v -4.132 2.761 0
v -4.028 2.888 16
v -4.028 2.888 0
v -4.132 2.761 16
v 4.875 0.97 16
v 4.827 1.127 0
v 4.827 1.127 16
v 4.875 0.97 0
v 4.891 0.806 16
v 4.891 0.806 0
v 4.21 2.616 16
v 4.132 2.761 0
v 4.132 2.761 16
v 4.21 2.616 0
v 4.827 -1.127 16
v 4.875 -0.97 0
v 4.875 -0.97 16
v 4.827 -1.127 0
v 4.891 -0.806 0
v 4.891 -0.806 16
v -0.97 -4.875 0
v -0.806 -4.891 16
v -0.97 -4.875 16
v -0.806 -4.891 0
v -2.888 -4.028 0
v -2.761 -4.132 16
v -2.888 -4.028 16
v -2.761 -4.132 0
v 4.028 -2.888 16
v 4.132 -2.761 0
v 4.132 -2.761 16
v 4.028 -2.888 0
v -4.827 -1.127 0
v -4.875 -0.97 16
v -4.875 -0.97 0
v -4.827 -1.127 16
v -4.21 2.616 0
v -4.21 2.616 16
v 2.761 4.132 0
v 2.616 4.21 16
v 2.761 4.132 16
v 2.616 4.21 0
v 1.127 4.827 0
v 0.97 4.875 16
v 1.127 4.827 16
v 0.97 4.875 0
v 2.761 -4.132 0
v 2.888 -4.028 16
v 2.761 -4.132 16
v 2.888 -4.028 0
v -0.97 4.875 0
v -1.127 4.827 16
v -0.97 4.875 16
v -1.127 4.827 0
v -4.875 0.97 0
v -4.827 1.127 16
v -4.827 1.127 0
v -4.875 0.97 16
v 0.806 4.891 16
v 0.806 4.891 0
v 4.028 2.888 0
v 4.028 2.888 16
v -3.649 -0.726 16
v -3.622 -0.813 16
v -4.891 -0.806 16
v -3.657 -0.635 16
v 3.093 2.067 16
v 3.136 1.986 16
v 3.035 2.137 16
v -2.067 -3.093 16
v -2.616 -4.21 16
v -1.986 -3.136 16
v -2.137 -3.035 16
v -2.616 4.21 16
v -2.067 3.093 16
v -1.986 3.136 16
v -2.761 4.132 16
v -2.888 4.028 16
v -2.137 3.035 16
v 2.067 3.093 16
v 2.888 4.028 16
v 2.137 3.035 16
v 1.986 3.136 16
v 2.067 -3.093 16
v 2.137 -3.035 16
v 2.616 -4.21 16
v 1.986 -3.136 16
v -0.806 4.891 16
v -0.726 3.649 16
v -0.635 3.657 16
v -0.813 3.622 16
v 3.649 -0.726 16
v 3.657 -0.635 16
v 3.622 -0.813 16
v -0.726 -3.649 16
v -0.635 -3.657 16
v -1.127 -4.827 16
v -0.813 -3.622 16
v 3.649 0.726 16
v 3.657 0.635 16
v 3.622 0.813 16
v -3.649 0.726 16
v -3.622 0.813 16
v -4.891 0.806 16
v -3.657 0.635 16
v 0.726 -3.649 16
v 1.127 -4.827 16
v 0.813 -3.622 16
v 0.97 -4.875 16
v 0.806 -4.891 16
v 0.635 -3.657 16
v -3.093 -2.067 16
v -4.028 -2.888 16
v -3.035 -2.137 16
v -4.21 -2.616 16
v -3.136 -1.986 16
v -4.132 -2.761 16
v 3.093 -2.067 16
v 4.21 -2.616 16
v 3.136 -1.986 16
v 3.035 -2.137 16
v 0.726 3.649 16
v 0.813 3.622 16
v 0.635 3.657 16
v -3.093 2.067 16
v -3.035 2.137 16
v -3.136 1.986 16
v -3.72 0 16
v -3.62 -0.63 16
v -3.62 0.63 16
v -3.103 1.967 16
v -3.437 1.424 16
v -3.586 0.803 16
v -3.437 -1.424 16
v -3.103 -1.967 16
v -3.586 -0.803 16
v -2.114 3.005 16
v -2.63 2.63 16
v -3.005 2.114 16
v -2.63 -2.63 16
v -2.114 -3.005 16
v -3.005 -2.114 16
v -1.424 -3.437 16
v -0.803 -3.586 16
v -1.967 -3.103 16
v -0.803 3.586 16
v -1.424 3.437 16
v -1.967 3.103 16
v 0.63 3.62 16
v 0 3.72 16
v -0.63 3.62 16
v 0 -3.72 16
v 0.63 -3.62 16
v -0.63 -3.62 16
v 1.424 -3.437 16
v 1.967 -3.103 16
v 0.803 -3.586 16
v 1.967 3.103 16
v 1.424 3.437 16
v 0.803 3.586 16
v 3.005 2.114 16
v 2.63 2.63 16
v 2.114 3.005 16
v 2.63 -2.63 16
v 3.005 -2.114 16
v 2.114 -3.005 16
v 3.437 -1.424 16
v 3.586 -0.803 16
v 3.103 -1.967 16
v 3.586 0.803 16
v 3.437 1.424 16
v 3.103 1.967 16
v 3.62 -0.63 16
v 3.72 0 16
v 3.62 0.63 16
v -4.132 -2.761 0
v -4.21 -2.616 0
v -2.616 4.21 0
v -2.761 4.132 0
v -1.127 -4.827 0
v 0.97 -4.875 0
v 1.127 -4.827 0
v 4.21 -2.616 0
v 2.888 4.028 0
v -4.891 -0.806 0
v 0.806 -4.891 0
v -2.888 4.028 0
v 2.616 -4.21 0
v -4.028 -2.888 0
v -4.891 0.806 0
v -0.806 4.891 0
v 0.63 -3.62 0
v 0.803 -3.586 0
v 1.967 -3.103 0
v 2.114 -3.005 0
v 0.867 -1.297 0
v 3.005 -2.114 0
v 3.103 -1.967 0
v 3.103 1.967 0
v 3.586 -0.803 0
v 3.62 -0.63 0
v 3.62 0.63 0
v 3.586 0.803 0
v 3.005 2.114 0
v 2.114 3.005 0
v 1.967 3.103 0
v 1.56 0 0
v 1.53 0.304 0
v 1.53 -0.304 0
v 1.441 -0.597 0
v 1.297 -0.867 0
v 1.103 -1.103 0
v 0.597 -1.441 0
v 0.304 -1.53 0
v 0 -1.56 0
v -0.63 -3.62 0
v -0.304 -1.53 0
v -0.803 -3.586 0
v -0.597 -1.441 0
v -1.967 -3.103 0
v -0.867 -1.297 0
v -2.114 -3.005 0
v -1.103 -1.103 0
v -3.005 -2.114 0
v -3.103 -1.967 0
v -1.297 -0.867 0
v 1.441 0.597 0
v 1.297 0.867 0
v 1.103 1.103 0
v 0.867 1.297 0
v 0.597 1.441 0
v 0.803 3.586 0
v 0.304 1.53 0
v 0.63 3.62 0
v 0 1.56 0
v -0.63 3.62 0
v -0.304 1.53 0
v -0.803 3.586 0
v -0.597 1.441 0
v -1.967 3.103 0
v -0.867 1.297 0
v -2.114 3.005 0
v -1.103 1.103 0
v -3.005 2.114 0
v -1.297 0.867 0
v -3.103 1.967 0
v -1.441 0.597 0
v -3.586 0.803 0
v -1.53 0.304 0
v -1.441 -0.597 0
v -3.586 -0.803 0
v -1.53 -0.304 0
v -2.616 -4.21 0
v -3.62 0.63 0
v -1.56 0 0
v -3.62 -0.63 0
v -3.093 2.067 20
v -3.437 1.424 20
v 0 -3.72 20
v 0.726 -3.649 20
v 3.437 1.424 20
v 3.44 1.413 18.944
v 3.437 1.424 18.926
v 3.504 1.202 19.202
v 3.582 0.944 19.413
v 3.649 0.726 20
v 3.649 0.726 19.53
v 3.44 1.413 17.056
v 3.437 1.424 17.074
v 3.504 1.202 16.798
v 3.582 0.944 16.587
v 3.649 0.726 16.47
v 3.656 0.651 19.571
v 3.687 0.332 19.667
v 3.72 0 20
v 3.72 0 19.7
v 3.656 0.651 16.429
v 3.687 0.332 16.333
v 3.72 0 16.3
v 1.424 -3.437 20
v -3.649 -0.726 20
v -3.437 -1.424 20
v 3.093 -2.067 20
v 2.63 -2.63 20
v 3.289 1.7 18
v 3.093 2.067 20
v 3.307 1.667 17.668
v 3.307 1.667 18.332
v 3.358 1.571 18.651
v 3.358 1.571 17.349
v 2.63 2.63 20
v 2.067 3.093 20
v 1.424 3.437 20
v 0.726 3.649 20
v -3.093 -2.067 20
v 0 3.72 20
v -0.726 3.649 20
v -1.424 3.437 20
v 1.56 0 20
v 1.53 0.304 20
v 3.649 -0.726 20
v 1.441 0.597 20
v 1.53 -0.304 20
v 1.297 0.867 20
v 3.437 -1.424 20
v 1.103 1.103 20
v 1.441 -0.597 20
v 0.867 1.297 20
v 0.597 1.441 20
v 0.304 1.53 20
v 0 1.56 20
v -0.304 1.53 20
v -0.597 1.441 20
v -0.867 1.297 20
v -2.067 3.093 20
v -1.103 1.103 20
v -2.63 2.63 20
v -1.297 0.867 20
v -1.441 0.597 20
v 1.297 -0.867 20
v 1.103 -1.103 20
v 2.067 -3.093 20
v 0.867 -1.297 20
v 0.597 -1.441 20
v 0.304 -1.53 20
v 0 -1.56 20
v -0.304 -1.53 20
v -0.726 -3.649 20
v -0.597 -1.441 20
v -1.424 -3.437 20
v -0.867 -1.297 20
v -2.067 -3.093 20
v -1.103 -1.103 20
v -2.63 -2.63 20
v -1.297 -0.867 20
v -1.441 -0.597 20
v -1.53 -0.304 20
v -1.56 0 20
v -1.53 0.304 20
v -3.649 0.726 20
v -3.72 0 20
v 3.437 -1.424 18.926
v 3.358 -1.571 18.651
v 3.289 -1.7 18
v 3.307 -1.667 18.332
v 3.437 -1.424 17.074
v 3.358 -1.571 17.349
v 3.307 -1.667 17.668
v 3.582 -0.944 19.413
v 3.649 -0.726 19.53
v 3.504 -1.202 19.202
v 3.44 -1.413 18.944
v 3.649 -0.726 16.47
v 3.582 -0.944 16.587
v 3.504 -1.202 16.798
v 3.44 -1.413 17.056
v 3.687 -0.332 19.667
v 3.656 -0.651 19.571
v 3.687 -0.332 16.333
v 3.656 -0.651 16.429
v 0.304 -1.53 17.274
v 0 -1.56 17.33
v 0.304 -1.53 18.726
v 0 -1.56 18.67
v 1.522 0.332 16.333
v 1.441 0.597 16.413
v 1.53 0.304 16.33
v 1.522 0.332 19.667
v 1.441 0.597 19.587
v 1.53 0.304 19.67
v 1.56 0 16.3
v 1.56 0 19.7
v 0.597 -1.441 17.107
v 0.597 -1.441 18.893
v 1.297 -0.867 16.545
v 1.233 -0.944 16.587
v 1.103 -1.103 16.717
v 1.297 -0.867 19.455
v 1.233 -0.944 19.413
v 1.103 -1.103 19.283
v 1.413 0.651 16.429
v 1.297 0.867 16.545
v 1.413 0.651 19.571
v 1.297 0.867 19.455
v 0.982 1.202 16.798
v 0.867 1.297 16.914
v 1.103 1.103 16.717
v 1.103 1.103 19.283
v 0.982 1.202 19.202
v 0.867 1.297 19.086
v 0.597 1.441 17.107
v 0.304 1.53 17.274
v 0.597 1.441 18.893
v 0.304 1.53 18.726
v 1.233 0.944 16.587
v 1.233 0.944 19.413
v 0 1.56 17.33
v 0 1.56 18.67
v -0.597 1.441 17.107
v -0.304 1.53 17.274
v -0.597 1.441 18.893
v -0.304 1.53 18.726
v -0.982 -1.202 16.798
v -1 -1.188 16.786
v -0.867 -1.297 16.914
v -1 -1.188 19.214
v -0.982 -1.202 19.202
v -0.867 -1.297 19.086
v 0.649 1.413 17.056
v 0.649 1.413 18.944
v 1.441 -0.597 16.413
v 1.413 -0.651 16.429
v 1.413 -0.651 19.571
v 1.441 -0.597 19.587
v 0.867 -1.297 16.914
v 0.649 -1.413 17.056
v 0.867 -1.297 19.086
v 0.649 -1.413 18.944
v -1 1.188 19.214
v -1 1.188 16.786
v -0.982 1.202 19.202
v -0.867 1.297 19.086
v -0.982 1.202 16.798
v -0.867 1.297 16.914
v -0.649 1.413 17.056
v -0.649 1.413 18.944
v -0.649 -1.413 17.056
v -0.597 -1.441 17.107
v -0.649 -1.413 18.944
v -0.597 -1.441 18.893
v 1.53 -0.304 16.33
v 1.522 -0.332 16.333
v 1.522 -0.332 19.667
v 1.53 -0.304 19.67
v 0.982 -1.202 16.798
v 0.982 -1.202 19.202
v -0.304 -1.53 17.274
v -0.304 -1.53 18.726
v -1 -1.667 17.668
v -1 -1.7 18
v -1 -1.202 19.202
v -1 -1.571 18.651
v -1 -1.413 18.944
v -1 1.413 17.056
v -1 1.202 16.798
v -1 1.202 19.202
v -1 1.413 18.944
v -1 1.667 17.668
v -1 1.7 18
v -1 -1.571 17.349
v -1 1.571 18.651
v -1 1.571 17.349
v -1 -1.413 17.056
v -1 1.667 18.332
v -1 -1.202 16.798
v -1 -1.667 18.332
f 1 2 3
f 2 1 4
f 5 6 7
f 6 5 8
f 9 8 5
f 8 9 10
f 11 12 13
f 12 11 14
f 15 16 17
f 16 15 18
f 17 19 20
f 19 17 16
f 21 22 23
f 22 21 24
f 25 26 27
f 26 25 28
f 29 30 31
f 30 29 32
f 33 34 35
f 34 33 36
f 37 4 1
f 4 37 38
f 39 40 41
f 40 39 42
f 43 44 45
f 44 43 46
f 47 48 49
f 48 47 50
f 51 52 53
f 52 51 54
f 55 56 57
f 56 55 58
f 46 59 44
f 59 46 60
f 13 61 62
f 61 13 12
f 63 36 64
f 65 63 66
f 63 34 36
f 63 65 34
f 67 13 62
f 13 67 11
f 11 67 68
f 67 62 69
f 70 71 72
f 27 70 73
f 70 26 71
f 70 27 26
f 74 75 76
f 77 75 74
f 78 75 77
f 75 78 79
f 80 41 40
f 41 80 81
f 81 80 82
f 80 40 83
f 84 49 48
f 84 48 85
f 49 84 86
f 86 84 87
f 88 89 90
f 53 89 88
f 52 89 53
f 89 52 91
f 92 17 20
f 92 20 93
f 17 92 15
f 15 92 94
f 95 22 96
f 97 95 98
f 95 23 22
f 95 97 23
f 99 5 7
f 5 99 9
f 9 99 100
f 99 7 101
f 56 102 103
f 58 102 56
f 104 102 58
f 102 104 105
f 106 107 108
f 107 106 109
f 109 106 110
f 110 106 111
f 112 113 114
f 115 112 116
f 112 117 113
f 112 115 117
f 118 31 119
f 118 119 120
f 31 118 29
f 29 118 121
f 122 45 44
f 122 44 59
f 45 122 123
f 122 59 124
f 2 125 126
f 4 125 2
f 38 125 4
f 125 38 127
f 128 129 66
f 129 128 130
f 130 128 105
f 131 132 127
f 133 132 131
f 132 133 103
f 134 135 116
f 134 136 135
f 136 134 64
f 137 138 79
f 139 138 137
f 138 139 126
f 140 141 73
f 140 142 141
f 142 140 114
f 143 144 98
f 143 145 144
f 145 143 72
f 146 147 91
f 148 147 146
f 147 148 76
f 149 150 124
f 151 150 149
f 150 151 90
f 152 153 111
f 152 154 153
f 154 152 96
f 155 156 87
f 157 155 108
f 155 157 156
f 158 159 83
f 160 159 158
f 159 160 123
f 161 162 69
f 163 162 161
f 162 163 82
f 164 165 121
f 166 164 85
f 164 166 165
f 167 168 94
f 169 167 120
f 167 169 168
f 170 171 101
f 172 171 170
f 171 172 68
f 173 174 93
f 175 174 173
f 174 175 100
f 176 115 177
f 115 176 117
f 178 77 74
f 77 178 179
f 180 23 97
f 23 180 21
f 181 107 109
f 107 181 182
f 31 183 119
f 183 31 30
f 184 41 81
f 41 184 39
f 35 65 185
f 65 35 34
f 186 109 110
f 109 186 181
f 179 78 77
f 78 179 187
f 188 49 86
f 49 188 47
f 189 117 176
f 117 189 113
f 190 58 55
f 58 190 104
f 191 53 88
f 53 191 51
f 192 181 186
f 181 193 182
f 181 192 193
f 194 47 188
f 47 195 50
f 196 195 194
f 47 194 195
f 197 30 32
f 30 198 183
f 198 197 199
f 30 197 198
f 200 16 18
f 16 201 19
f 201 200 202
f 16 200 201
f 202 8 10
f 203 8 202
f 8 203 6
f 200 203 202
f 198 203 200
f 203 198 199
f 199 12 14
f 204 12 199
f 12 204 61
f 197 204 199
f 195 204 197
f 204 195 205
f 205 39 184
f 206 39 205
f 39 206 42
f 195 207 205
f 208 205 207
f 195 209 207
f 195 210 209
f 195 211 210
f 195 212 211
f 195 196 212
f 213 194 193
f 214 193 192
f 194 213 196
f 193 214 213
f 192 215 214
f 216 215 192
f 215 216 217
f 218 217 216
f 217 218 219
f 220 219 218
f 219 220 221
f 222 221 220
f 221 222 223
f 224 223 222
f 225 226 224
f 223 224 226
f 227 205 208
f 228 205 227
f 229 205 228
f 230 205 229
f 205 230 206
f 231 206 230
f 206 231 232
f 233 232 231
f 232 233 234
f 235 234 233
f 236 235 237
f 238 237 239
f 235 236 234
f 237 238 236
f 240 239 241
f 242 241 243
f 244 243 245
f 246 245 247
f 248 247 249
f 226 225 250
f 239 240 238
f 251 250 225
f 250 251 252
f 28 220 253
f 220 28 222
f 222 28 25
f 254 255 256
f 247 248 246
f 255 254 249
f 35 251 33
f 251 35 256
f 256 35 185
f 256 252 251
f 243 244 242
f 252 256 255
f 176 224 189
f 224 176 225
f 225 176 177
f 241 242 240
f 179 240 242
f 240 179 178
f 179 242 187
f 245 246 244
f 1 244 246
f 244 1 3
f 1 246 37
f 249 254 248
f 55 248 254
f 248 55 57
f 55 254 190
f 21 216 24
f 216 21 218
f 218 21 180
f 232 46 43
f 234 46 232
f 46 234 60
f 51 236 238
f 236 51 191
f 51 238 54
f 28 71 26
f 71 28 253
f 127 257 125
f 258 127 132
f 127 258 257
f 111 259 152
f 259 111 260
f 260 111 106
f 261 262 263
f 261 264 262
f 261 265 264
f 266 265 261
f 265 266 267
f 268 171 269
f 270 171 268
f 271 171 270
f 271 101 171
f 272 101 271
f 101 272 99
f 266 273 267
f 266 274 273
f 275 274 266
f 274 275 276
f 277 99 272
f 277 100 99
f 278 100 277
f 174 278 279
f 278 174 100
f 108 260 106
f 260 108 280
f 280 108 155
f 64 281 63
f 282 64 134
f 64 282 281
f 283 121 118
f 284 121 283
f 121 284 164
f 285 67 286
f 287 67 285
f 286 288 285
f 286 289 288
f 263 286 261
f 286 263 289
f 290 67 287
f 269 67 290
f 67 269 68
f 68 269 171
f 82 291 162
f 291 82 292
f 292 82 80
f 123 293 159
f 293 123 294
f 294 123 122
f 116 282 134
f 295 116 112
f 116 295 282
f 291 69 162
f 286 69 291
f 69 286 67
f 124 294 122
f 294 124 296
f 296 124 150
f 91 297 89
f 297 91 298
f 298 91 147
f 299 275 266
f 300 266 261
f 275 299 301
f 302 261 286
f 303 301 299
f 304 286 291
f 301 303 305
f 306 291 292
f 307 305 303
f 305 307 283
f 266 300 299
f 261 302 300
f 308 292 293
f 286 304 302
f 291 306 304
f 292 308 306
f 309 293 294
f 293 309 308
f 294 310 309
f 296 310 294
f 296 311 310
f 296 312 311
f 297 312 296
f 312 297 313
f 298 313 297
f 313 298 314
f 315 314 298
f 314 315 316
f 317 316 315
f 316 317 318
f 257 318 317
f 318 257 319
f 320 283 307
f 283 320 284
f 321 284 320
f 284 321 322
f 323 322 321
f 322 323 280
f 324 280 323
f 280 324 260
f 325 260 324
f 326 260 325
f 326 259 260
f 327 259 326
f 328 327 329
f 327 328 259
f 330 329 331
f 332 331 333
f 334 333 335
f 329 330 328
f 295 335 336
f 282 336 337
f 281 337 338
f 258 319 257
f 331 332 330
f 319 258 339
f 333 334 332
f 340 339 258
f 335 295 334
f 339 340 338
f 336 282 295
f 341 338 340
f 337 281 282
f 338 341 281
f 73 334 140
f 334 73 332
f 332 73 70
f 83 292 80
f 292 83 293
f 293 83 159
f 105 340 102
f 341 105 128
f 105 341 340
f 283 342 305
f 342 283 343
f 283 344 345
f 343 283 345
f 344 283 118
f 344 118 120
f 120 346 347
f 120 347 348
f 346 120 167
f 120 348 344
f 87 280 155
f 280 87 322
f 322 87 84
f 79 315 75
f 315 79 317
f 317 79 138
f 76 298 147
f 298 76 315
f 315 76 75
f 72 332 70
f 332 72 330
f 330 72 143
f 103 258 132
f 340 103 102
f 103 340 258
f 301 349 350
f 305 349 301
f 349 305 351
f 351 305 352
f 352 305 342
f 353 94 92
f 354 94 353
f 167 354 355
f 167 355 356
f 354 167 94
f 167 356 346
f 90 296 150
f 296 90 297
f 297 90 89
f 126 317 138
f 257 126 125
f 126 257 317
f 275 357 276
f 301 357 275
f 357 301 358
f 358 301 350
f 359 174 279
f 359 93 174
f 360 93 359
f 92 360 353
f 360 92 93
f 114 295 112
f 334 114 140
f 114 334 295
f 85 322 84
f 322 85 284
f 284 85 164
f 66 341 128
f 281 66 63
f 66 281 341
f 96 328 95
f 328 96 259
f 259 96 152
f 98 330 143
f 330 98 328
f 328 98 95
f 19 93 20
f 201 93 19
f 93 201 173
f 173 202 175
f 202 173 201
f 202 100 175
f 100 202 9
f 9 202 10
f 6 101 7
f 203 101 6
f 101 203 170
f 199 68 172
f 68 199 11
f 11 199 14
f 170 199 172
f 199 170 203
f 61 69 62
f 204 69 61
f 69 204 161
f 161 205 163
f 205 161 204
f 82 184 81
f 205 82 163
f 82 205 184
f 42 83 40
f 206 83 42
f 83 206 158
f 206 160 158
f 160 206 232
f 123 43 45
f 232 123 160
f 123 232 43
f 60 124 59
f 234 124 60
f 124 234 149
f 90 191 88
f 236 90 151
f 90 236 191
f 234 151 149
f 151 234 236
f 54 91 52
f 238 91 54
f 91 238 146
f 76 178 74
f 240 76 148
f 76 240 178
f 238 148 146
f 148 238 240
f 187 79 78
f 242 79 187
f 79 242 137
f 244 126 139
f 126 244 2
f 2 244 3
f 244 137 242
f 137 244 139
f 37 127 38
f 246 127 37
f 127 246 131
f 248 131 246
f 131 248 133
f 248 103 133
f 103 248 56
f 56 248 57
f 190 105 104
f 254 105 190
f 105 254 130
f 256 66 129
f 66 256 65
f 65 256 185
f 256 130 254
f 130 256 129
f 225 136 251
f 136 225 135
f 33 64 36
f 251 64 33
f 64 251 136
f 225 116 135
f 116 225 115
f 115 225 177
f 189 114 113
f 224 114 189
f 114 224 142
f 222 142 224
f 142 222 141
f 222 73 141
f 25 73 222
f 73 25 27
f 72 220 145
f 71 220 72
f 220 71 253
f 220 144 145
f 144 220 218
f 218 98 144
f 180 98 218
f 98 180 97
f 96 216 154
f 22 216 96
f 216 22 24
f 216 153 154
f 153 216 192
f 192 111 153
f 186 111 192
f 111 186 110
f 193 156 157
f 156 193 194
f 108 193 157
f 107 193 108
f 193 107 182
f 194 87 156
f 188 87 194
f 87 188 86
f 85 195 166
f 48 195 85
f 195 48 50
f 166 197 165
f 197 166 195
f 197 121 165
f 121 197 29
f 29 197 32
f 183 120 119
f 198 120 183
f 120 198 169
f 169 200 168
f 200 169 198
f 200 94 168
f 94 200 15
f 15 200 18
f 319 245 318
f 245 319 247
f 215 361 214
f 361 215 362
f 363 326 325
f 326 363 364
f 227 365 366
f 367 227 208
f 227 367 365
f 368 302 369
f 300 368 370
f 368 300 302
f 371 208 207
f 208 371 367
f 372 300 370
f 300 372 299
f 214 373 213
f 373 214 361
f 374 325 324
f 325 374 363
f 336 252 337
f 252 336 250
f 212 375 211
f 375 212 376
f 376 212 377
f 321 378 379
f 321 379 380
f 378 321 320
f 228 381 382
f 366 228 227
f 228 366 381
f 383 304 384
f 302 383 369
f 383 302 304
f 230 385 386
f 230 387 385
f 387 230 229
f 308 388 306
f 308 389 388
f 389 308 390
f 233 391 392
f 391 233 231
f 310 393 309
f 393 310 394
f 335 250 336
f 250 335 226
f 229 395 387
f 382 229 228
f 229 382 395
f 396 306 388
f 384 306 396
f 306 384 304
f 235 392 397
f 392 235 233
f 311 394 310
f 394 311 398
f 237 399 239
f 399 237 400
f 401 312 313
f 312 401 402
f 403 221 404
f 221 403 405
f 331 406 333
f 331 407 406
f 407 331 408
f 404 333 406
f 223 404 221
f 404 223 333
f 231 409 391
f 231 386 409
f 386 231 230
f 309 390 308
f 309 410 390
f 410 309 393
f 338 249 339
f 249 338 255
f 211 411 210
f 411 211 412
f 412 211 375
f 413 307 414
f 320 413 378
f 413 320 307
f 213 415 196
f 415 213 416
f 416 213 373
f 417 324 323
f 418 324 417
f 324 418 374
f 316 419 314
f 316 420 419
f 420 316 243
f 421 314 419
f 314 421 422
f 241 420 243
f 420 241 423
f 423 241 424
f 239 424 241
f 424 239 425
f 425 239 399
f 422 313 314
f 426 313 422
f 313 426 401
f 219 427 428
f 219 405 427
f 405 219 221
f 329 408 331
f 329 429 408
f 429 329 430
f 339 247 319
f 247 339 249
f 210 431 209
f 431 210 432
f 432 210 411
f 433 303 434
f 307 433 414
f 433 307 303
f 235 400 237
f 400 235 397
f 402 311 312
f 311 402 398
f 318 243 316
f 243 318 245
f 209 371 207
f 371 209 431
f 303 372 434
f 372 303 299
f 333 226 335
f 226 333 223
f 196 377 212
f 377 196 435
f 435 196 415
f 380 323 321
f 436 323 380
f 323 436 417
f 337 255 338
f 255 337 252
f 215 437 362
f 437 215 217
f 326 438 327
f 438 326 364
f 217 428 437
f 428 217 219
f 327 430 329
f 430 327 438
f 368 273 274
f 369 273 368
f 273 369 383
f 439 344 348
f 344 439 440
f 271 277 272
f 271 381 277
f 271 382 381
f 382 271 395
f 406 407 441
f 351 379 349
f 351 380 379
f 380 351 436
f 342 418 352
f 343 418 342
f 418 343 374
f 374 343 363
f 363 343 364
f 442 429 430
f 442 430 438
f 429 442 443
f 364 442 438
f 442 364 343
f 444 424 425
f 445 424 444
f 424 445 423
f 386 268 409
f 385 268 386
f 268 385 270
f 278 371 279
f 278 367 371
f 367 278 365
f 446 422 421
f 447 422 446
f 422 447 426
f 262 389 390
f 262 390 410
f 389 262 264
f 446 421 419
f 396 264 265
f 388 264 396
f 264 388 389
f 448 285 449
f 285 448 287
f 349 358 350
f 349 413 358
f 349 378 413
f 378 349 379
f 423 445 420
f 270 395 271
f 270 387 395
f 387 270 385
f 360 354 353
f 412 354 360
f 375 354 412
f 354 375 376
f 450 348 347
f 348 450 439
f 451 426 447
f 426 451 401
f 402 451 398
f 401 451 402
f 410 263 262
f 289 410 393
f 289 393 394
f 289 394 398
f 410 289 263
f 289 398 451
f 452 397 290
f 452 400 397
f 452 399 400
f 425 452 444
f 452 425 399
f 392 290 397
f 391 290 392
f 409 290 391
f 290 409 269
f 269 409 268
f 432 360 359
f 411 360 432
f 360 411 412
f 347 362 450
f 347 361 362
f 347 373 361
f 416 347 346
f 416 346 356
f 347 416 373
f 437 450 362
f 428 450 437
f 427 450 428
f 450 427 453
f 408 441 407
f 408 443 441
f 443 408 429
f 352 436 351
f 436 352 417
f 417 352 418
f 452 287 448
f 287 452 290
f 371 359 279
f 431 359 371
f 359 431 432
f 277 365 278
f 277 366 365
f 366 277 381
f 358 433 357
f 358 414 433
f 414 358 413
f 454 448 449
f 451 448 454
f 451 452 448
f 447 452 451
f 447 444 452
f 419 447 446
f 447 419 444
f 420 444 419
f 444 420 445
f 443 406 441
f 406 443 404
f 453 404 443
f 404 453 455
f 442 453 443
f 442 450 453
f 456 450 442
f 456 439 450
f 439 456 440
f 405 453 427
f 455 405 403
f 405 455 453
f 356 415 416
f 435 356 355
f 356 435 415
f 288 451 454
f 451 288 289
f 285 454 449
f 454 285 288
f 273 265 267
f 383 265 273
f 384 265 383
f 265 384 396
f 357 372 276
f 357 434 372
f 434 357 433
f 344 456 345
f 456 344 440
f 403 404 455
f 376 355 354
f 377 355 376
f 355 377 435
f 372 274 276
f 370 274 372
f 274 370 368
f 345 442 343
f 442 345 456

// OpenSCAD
$fn = 32;

// ----------------------------------------------------------------------
// Timing pulley: GT2 16T, pitch 2 mm, 9.94 mm x 20 mm
// ----------------------------------------------------------------------

// --- parameters (mm) ---
belt_pitch = 2;           // belt pitch
n_teeth = 16;             // number of grooves
rim_w = 16;               // belt width between the flanges
tip_d = 9.94;             // tip circle diameter
root_d = 8.44;            // groove bottom diameter
groove_h = 0.75;          // groove depth
tooth_w = 1.5;            // groove width at the tip circle
shaft_d = 3.12;           // shaft bore
hub_d = 7.44;             // hub diameter
hub_h = 4;                // hub above the flange
bottom_z = 0;             // lowest point of the pulley
top_z = 20;               // highest point of the pulley
set_d = 3.4;              // set screw tap hole

module rim() {
  cylinder(h = rim_w, d = tip_d);
}

module groove_cutter() {
  /* belt tooth groove: deeper than wide, cut through the belt width */
  translate([root_d / 2, 0, 0])
    linear_extrude(height = rim_w)
      polygon(points = [[-0.6, -tooth_w * 0.42], [groove_h + 0.6, -tooth_w * 0.6],
                        [groove_h + 0.6, tooth_w * 0.6], [-0.6, tooth_w * 0.42]]);
}

module hub() {
  translate([0, 0, bottom_z]) cylinder(h = top_z - bottom_z, d = hub_d);
}

difference() {
  union() {
    rim();
    hub();
  }
  for (i = [0 : n_teeth - 1]) rotate([0, 0, i * 360 / n_teeth]) groove_cutter();
  translate([0, 0, bottom_z - 1]) cylinder(h = top_z - bottom_z + 2, d = shaft_d);
  translate([-1, 0, top_z - hub_h * 0.5]) rotate([0, 90, 0]) cylinder(h = hub_d / 2 + 3, d = set_d);
}
